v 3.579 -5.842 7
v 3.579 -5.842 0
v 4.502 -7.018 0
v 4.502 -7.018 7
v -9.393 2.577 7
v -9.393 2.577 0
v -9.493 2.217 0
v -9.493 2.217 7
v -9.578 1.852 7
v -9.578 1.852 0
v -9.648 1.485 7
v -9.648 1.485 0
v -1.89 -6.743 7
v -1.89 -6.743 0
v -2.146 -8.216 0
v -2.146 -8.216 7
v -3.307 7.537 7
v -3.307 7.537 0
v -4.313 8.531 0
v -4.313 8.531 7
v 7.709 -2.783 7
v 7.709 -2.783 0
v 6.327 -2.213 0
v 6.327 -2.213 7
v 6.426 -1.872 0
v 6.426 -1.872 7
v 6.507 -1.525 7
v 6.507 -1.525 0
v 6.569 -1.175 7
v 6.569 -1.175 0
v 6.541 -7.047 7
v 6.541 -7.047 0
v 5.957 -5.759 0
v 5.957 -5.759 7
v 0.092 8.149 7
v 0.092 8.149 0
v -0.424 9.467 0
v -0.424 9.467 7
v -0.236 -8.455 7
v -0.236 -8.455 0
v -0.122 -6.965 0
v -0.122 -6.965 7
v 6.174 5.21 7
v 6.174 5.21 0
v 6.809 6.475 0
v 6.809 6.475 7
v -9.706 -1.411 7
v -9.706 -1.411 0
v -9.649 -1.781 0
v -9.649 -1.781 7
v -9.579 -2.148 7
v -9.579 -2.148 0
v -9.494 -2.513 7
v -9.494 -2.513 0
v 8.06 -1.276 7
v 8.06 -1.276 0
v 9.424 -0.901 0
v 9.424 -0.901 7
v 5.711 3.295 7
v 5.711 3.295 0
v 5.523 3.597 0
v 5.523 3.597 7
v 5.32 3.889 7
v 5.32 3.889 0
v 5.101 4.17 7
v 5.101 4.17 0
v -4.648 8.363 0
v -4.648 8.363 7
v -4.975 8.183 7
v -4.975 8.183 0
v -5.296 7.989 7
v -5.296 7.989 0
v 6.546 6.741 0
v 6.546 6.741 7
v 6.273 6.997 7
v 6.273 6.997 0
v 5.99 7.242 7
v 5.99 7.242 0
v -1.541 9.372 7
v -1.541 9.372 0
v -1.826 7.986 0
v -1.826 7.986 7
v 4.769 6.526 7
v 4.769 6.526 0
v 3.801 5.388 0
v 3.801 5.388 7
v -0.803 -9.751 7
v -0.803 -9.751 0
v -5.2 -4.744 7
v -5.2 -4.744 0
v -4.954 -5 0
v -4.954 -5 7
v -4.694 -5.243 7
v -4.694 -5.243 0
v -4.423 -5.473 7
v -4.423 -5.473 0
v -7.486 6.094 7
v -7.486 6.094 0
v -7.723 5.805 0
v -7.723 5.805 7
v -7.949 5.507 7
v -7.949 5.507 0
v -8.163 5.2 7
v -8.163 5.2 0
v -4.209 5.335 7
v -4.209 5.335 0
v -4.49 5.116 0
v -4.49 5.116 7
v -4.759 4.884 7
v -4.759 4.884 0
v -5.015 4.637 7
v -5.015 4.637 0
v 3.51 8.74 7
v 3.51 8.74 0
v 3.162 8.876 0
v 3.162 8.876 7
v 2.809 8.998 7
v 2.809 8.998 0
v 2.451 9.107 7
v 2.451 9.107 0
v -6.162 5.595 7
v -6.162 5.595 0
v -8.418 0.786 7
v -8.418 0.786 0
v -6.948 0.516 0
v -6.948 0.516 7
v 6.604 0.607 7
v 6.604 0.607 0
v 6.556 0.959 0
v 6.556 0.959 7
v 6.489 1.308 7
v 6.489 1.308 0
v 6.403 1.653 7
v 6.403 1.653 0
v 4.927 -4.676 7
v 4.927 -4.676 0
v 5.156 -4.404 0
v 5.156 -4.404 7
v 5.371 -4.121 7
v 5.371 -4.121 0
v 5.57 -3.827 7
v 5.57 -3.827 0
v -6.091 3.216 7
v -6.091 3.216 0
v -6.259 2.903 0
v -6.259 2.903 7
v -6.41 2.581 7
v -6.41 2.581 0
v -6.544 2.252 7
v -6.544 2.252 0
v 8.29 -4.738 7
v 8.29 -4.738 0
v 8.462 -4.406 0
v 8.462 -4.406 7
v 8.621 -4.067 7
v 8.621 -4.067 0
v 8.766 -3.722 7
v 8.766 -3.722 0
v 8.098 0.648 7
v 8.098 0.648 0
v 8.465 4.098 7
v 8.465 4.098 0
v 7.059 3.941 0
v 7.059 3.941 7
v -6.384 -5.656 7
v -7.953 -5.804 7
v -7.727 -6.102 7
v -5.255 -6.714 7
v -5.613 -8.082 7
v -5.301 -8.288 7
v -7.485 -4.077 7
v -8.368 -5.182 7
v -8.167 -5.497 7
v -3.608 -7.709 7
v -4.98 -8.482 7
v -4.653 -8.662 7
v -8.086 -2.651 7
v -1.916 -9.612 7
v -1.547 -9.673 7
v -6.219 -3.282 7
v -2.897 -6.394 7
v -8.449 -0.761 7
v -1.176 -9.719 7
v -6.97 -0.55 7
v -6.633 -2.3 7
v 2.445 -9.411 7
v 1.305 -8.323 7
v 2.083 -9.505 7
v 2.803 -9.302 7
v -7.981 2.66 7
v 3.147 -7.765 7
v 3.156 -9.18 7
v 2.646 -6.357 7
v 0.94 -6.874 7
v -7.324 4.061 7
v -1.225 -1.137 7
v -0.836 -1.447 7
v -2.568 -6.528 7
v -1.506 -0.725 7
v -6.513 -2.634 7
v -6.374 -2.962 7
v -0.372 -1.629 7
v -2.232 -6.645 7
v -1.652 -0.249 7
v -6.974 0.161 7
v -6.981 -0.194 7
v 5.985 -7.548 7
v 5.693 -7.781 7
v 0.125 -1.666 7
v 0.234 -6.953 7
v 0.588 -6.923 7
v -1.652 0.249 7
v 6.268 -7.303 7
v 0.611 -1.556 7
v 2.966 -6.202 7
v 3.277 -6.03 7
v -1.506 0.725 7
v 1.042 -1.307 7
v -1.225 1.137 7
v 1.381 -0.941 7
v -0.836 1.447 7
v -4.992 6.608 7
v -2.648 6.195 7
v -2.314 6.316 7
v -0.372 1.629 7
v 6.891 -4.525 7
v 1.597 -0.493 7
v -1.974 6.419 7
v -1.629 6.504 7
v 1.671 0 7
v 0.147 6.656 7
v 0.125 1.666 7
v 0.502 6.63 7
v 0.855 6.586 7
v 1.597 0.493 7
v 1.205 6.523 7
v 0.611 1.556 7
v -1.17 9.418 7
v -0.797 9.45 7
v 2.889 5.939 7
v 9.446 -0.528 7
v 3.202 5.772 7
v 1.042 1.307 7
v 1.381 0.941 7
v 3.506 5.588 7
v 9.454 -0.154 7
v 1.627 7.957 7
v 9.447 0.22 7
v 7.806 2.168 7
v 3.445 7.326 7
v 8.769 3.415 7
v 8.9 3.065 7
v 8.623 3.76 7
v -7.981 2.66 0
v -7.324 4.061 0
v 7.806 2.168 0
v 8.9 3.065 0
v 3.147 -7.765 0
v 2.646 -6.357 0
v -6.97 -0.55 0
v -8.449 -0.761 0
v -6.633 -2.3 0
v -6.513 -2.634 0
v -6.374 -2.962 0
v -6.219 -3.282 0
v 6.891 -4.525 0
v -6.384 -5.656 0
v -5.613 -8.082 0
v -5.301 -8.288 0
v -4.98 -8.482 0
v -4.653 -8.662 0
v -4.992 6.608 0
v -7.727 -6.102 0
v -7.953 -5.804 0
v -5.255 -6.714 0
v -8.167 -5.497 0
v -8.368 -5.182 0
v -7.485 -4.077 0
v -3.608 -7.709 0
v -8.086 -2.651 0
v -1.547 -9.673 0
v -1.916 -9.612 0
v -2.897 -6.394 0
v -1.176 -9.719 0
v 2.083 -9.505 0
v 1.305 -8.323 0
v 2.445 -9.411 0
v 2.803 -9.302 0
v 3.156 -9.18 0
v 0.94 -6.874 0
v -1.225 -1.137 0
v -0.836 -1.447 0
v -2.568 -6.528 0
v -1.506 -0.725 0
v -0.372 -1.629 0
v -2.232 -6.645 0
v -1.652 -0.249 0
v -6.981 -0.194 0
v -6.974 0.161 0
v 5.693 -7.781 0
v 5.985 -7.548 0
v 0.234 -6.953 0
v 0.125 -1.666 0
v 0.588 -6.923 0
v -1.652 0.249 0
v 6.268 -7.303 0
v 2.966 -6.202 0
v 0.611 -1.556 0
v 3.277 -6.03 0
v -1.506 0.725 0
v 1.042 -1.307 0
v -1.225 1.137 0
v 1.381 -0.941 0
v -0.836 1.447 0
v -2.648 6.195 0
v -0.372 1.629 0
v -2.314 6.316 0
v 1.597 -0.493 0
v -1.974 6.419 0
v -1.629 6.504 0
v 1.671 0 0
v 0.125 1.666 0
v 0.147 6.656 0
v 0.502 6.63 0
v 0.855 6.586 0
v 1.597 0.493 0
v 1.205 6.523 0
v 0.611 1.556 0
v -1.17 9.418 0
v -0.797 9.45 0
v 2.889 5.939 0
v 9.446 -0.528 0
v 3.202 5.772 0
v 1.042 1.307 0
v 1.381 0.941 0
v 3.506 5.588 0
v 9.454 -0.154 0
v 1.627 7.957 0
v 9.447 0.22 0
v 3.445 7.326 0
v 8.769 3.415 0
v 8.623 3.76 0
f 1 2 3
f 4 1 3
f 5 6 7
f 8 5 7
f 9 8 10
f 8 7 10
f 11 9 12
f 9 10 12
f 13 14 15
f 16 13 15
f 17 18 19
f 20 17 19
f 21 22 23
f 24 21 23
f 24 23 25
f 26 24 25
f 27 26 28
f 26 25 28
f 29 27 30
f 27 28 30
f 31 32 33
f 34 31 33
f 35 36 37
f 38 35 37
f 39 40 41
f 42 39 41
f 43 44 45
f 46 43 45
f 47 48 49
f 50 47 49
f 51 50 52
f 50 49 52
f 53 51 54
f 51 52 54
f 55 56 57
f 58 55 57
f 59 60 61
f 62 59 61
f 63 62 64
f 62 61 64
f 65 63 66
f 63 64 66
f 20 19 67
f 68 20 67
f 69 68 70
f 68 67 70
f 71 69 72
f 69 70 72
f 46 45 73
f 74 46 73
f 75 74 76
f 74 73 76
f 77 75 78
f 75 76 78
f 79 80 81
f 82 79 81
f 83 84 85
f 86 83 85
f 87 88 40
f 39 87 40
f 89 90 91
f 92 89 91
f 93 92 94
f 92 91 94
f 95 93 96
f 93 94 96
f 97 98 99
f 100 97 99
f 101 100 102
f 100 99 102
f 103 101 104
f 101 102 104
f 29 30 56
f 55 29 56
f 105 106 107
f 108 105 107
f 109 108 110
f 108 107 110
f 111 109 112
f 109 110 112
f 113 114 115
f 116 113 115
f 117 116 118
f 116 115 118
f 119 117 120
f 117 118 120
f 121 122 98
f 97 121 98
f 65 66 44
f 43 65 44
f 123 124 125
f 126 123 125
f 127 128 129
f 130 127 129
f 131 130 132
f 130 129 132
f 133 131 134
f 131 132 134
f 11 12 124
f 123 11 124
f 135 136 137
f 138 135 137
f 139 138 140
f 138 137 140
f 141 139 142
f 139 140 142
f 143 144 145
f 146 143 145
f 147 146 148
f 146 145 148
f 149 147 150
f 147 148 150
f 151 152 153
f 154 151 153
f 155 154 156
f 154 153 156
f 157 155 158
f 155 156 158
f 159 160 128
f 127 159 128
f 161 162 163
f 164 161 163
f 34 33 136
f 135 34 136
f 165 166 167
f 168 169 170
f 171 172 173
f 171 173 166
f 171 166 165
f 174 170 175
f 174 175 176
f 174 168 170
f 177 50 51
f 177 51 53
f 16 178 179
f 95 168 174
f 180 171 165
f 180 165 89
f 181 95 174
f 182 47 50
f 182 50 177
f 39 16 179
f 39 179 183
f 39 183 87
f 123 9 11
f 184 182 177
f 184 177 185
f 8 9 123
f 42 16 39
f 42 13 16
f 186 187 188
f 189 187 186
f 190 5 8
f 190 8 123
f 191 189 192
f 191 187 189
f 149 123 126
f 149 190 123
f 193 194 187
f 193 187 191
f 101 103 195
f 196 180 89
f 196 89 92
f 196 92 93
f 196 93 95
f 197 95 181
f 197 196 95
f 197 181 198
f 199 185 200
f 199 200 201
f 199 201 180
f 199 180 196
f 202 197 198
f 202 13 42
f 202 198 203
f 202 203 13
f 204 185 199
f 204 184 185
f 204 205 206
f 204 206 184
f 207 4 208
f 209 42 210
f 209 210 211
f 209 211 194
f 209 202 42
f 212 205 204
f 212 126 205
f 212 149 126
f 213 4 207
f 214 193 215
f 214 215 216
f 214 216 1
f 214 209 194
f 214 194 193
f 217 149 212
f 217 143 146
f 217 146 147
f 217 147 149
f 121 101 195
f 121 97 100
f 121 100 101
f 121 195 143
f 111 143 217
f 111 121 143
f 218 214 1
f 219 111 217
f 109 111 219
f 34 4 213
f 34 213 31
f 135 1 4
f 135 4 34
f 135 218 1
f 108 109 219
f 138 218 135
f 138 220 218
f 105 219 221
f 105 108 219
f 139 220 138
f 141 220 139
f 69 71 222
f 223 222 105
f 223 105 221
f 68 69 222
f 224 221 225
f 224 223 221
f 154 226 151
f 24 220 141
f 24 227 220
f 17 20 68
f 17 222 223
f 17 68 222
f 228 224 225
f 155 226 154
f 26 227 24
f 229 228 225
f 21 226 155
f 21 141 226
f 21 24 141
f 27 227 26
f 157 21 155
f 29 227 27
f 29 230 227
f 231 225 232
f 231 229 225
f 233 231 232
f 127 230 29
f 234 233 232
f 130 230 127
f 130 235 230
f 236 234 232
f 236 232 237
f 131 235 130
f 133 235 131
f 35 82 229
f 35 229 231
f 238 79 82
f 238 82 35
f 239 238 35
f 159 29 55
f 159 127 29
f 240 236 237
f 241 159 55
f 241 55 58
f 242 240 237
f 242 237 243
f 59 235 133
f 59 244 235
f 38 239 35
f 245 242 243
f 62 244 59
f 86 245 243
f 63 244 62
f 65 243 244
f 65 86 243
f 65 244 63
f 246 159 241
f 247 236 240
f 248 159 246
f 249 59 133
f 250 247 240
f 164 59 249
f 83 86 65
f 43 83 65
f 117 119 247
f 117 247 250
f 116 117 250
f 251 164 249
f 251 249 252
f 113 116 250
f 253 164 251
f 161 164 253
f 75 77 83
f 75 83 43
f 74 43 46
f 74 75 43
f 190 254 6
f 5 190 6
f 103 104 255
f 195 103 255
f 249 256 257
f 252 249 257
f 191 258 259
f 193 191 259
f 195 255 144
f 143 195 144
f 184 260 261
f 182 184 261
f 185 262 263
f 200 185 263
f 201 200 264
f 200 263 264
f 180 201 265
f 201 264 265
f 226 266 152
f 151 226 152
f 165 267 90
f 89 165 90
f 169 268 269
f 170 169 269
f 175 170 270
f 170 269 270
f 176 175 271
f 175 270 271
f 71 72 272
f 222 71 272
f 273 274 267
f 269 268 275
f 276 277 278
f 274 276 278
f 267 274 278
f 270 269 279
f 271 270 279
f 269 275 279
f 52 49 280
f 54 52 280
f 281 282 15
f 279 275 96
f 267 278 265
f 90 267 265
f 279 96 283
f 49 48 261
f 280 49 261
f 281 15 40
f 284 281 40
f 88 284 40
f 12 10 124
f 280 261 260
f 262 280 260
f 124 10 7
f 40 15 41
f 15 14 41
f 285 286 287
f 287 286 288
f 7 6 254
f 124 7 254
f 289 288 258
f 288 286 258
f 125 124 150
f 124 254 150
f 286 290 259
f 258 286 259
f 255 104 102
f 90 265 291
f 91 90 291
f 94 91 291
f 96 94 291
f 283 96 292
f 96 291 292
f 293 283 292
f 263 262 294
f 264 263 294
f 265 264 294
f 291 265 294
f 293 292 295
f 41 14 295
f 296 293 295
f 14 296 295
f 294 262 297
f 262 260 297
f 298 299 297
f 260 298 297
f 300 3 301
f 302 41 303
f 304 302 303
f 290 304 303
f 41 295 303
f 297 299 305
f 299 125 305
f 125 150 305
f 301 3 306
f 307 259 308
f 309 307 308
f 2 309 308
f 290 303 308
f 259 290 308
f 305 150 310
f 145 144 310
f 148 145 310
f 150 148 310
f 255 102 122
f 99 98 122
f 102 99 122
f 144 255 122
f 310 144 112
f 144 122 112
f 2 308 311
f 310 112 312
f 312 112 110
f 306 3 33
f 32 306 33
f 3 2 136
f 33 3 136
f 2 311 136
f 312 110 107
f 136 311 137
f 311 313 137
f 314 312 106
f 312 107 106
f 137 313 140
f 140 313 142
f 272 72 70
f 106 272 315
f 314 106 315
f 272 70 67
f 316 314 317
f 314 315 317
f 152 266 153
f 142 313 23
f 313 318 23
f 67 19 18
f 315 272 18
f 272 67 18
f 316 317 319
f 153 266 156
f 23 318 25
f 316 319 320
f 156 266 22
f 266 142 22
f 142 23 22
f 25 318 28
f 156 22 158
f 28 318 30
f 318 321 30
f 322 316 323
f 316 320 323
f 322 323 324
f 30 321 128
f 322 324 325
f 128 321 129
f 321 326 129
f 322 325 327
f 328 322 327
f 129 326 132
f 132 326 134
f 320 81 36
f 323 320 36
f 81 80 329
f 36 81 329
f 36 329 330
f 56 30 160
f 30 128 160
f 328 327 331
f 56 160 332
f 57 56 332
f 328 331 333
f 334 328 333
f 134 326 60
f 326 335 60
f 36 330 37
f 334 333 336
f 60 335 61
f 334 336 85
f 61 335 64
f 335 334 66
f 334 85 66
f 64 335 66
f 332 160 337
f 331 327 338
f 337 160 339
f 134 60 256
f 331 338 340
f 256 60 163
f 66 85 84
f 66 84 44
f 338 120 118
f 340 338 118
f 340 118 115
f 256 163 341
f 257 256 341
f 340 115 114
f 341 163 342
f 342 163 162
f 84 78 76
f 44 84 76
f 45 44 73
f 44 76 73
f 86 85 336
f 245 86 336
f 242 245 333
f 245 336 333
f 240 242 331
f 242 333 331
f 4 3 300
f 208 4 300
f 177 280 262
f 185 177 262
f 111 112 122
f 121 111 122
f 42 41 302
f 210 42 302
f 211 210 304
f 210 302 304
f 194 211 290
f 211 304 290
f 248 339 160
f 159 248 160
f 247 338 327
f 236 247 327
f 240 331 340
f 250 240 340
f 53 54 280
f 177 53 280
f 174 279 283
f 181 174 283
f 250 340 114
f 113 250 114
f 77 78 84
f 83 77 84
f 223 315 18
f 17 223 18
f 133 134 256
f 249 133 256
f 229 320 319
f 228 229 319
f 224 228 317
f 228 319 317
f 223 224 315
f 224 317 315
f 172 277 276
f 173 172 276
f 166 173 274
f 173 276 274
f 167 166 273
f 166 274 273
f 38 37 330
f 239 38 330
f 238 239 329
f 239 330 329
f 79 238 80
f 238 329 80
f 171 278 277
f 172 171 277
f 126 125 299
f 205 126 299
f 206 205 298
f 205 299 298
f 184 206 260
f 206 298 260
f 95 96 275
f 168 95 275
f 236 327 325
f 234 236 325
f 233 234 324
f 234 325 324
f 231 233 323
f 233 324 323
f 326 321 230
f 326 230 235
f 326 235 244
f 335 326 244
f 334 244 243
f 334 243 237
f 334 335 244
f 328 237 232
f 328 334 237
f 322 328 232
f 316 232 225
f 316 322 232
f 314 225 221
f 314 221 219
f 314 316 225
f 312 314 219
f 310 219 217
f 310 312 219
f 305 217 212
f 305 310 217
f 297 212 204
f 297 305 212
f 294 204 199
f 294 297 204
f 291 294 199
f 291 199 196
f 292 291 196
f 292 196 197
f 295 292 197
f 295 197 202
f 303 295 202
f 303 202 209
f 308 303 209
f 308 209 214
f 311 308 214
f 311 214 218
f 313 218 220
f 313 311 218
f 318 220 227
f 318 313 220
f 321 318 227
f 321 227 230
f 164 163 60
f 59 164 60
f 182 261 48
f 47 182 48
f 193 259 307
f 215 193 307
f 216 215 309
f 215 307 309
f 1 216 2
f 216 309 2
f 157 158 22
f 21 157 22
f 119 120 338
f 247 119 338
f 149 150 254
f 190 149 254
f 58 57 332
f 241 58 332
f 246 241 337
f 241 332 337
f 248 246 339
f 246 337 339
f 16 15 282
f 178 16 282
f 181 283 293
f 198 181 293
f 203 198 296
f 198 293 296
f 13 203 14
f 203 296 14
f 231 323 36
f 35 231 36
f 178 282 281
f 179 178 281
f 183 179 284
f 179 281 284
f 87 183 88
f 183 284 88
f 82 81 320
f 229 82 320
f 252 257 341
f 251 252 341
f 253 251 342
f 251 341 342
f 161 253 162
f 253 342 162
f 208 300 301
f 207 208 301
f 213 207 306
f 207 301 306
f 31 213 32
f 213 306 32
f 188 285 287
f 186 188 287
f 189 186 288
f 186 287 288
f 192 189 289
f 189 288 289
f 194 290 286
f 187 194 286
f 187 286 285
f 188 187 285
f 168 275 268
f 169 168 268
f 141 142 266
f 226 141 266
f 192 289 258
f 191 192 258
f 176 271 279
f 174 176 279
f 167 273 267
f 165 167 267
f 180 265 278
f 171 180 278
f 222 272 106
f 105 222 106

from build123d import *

# Parameters (mm, degrees)
F0_R     = 1.671135
F1_DEPTH = 7


with BuildPart() as f1:
    # F0 (on Top) → F1 (new body)
    with BuildSketch(Plane.XY):
        with BuildLine():
            ThreePointArc((5.710763, 3.295388), (5.423242, 3.744527), (5.101476, 4.169805))
            Line((5.101476, 4.169805), (6.17403, 5.210492))
            Line((6.17403, 5.210492), (6.80854, 6.475035))
            ThreePointArc((6.80854, 6.475035), (6.41041, 6.87043), (5.989907, 7.241943))
            Line((5.989907, 7.241943), (4.769408, 6.526365))
            Line((4.769408, 6.526365), (3.800837, 5.388265))
            ThreePointArc((3.800837, 5.388265), (3.355492, 5.681629), (2.888568, 5.939266))
            Line((2.888568, 5.939266), (3.445109, 7.326228))
            Line((3.445109, 7.326228), (3.510427, 8.739523))
            ThreePointArc((3.510427, 8.739523), (2.985895, 8.938801), (2.450639, 9.107161))
            Line((2.450639, 9.107161), (1.626709, 7.957026))
            Line((1.626709, 7.957026), (1.204783, 6.523367))
            ThreePointArc((1.204783, 6.523367), (0.678618, 6.61023), (0.147272, 6.655678))
            Line((0.147272, 6.655678), (0.091568, 8.149096))
            Line((0.091568, 8.149096), (-0.4236, 9.466773))
            ThreePointArc((-0.4236, 9.466773), (-0.983837, 9.435476), (-1.541296, 9.371572))
            Line((-1.541296, 9.371572), (-1.826192, 7.985749))
            Line((-1.826192, 7.985749), (-1.628518, 6.504423))
            ThreePointArc((-1.628518, 6.504423), (-2.144524, 6.369766), (-2.648419, 6.195167))
            Line((-2.648419, 6.195167), (-3.306734, 7.536816))
            Line((-3.306734, 7.536816), (-4.313311, 8.531036))
            ThreePointArc((-4.313311, 8.531036), (-4.812383, 8.274576), (-5.295656, 7.989458))
            Line((-5.295656, 7.989458), (-4.992256, 6.607568))
            Line((-4.992256, 6.607568), (-4.209163, 5.33471))
            ThreePointArc((-4.209163, 5.33471), (-4.625787, 5.001816), (-5.015102, 4.63736))
            Line((-5.015102, 4.63736), (-6.162201, 5.595256))
            Line((-6.162201, 5.595256), (-7.486141, 6.09411))
            ThreePointArc((-7.486141, 6.09411), (-7.837754, 5.656831), (-8.163277, 5.199798))
            Line((-8.163277, 5.199798), (-7.324043, 4.060783))
            Line((-7.324043, 4.060783), (-6.090934, 3.216482))
            ThreePointArc((-6.090934, 3.216482), (-6.336139, 2.742911), (-6.543558, 2.251615))
            Line((-6.543558, 2.251615), (-7.981096, 2.66013))
            Line((-7.981096, 2.66013), (-9.393477, 2.57736))
            ThreePointArc((-9.393477, 2.57736), (-9.536835, 2.034872), (-9.648323, 1.484949))
            Line((-9.648323, 1.484949), (-8.418365, 0.785755))
            Line((-8.418365, 0.785755), (-6.948456, 0.515998))
            ThreePointArc((-6.948456, 0.515998), (-6.979843, -0.016364), (-6.969502, -0.54955))
            Line((-6.969502, -0.54955), (-8.448917, -0.761053))
            Line((-8.448917, -0.761053), (-9.705525, -1.411133))
            ThreePointArc((-9.705525, -1.411133), (-9.615839, -1.96503), (-9.494015, -2.512756))
            Line((-9.494015, -2.512756), (-8.086004, -2.651232))
            Line((-8.086004, -2.651232), (-6.633455, -2.299801))
            ThreePointArc((-6.633455, -2.299801), (-6.445598, -2.798905), (-6.219285, -3.281788))
            Line((-6.219285, -3.281788), (-7.484771, -4.076738))
            Line((-7.484771, -4.076738), (-8.368329, -5.181725))
            ThreePointArc((-8.368329, -5.181725), (-8.061106, -5.651256), (-7.727034, -6.102078))
            Line((-7.727034, -6.102078), (-6.384429, -5.655893))
            Line((-6.384429, -5.655893), (-5.200399, -4.74404))
            ThreePointArc((-5.200399, -4.74404), (-4.82578, -5.123586), (-4.422625, -5.472672))
            Line((-4.422625, -5.472672), (-5.25537, -6.713614))
            Line((-5.25537, -6.713614), (-5.613101, -8.082445))
            ThreePointArc((-5.613101, -8.082445), (-5.141464, -8.386424), (-4.652908, -8.662392))
            Line((-4.652908, -8.662392), (-3.607857, -7.708695))
            Line((-3.607857, -7.708695), (-2.897076, -6.394087))
            ThreePointArc((-2.897076, -6.394087), (-2.400469, -6.588448), (-1.890183, -6.743376))
            Line((-1.890183, -6.743376), (-2.146196, -8.215741))
            Line((-2.146196, -8.215741), (-1.916246, -9.611733))
            ThreePointArc((-1.916246, -9.611733), (-1.361745, -9.6976), (-0.803181, -9.750995))
            Line((-0.803181, -9.750995), (-0.236382, -8.454689))
            Line((-0.236382, -8.454689), (-0.121751, -6.964634))
            ThreePointArc((-0.121751, -6.964634), (0.410976, -6.940203), (0.94016, -6.874185))
            Line((0.94016, -6.874185), (1.305145, -8.323388))
            Line((1.305145, -8.323388), (2.083016, -9.505161))
            ThreePointArc((2.083016, -9.505161), (2.624504, -9.358067), (3.156495, -9.179658))
            Line((3.156495, -9.179658), (3.147036, -7.764886))
            Line((3.147036, -7.764886), (2.645697, -6.357029))
            ThreePointArc((2.645697, -6.357029), (3.12243, -6.11803), (3.579012, -5.842481))
            Line((3.579012, -5.842481), (4.501887, -7.01794))
            Line((4.501887, -7.01794), (5.693177, -7.781155))
            ThreePointArc((5.693177, -7.781155), (6.128022, -7.426536), (6.541455, -7.047171))
            Line((6.541455, -7.047171), (5.957374, -5.758559))
            Line((5.957374, -5.758559), (4.926751, -4.676331))
            ThreePointArc((4.926751, -4.676331), (5.265059, -4.26409), (5.570092, -3.826655))
            Line((5.570092, -3.826655), (6.891282, -4.525123))
            Line((6.891282, -4.525123), (8.290007, -4.737813))
            ThreePointArc((8.290007, -4.737813), (8.543022, -4.236985), (8.766409, -3.722259))
            Line((8.766409, -3.722259), (7.708699, -2.782621))
            Line((7.708699, -2.782621), (6.326996, -2.213148))
            ThreePointArc((6.326996, -2.213148), (6.468383, -1.698945), (6.569123, -1.17526))
            Line((6.569123, -1.17526), (8.060183, -1.275967))
            Line((8.060183, -1.275967), (9.424491, -0.901356))
            ThreePointArc((9.424491, -0.901356), (9.451926, -0.340917), (9.446643, 0.220169))
            Line((9.446643, 0.220169), (8.098191, 0.648361))
            Line((8.098191, 0.648361), (6.604317, 0.606612))
            ThreePointArc((6.604317, 0.606612), (6.524335, 1.133866), (6.403364, 1.653251))
            Line((6.403364, 1.653251), (7.806476, 2.16772))
            Line((7.806476, 2.16772), (8.900465, 3.064858))
            ThreePointArc((8.900465, 3.064858), (8.697577, 3.588004), (8.464537, 4.098432))
            Line((8.464537, 4.098432), (7.058504, 3.941141))
            Line((7.058504, 3.941141), (5.710763, 3.295388))
        make_face()
        Circle(F0_R, mode=Mode.SUBTRACT)
    extrude(amount=F1_DEPTH)


solid = f1.part
